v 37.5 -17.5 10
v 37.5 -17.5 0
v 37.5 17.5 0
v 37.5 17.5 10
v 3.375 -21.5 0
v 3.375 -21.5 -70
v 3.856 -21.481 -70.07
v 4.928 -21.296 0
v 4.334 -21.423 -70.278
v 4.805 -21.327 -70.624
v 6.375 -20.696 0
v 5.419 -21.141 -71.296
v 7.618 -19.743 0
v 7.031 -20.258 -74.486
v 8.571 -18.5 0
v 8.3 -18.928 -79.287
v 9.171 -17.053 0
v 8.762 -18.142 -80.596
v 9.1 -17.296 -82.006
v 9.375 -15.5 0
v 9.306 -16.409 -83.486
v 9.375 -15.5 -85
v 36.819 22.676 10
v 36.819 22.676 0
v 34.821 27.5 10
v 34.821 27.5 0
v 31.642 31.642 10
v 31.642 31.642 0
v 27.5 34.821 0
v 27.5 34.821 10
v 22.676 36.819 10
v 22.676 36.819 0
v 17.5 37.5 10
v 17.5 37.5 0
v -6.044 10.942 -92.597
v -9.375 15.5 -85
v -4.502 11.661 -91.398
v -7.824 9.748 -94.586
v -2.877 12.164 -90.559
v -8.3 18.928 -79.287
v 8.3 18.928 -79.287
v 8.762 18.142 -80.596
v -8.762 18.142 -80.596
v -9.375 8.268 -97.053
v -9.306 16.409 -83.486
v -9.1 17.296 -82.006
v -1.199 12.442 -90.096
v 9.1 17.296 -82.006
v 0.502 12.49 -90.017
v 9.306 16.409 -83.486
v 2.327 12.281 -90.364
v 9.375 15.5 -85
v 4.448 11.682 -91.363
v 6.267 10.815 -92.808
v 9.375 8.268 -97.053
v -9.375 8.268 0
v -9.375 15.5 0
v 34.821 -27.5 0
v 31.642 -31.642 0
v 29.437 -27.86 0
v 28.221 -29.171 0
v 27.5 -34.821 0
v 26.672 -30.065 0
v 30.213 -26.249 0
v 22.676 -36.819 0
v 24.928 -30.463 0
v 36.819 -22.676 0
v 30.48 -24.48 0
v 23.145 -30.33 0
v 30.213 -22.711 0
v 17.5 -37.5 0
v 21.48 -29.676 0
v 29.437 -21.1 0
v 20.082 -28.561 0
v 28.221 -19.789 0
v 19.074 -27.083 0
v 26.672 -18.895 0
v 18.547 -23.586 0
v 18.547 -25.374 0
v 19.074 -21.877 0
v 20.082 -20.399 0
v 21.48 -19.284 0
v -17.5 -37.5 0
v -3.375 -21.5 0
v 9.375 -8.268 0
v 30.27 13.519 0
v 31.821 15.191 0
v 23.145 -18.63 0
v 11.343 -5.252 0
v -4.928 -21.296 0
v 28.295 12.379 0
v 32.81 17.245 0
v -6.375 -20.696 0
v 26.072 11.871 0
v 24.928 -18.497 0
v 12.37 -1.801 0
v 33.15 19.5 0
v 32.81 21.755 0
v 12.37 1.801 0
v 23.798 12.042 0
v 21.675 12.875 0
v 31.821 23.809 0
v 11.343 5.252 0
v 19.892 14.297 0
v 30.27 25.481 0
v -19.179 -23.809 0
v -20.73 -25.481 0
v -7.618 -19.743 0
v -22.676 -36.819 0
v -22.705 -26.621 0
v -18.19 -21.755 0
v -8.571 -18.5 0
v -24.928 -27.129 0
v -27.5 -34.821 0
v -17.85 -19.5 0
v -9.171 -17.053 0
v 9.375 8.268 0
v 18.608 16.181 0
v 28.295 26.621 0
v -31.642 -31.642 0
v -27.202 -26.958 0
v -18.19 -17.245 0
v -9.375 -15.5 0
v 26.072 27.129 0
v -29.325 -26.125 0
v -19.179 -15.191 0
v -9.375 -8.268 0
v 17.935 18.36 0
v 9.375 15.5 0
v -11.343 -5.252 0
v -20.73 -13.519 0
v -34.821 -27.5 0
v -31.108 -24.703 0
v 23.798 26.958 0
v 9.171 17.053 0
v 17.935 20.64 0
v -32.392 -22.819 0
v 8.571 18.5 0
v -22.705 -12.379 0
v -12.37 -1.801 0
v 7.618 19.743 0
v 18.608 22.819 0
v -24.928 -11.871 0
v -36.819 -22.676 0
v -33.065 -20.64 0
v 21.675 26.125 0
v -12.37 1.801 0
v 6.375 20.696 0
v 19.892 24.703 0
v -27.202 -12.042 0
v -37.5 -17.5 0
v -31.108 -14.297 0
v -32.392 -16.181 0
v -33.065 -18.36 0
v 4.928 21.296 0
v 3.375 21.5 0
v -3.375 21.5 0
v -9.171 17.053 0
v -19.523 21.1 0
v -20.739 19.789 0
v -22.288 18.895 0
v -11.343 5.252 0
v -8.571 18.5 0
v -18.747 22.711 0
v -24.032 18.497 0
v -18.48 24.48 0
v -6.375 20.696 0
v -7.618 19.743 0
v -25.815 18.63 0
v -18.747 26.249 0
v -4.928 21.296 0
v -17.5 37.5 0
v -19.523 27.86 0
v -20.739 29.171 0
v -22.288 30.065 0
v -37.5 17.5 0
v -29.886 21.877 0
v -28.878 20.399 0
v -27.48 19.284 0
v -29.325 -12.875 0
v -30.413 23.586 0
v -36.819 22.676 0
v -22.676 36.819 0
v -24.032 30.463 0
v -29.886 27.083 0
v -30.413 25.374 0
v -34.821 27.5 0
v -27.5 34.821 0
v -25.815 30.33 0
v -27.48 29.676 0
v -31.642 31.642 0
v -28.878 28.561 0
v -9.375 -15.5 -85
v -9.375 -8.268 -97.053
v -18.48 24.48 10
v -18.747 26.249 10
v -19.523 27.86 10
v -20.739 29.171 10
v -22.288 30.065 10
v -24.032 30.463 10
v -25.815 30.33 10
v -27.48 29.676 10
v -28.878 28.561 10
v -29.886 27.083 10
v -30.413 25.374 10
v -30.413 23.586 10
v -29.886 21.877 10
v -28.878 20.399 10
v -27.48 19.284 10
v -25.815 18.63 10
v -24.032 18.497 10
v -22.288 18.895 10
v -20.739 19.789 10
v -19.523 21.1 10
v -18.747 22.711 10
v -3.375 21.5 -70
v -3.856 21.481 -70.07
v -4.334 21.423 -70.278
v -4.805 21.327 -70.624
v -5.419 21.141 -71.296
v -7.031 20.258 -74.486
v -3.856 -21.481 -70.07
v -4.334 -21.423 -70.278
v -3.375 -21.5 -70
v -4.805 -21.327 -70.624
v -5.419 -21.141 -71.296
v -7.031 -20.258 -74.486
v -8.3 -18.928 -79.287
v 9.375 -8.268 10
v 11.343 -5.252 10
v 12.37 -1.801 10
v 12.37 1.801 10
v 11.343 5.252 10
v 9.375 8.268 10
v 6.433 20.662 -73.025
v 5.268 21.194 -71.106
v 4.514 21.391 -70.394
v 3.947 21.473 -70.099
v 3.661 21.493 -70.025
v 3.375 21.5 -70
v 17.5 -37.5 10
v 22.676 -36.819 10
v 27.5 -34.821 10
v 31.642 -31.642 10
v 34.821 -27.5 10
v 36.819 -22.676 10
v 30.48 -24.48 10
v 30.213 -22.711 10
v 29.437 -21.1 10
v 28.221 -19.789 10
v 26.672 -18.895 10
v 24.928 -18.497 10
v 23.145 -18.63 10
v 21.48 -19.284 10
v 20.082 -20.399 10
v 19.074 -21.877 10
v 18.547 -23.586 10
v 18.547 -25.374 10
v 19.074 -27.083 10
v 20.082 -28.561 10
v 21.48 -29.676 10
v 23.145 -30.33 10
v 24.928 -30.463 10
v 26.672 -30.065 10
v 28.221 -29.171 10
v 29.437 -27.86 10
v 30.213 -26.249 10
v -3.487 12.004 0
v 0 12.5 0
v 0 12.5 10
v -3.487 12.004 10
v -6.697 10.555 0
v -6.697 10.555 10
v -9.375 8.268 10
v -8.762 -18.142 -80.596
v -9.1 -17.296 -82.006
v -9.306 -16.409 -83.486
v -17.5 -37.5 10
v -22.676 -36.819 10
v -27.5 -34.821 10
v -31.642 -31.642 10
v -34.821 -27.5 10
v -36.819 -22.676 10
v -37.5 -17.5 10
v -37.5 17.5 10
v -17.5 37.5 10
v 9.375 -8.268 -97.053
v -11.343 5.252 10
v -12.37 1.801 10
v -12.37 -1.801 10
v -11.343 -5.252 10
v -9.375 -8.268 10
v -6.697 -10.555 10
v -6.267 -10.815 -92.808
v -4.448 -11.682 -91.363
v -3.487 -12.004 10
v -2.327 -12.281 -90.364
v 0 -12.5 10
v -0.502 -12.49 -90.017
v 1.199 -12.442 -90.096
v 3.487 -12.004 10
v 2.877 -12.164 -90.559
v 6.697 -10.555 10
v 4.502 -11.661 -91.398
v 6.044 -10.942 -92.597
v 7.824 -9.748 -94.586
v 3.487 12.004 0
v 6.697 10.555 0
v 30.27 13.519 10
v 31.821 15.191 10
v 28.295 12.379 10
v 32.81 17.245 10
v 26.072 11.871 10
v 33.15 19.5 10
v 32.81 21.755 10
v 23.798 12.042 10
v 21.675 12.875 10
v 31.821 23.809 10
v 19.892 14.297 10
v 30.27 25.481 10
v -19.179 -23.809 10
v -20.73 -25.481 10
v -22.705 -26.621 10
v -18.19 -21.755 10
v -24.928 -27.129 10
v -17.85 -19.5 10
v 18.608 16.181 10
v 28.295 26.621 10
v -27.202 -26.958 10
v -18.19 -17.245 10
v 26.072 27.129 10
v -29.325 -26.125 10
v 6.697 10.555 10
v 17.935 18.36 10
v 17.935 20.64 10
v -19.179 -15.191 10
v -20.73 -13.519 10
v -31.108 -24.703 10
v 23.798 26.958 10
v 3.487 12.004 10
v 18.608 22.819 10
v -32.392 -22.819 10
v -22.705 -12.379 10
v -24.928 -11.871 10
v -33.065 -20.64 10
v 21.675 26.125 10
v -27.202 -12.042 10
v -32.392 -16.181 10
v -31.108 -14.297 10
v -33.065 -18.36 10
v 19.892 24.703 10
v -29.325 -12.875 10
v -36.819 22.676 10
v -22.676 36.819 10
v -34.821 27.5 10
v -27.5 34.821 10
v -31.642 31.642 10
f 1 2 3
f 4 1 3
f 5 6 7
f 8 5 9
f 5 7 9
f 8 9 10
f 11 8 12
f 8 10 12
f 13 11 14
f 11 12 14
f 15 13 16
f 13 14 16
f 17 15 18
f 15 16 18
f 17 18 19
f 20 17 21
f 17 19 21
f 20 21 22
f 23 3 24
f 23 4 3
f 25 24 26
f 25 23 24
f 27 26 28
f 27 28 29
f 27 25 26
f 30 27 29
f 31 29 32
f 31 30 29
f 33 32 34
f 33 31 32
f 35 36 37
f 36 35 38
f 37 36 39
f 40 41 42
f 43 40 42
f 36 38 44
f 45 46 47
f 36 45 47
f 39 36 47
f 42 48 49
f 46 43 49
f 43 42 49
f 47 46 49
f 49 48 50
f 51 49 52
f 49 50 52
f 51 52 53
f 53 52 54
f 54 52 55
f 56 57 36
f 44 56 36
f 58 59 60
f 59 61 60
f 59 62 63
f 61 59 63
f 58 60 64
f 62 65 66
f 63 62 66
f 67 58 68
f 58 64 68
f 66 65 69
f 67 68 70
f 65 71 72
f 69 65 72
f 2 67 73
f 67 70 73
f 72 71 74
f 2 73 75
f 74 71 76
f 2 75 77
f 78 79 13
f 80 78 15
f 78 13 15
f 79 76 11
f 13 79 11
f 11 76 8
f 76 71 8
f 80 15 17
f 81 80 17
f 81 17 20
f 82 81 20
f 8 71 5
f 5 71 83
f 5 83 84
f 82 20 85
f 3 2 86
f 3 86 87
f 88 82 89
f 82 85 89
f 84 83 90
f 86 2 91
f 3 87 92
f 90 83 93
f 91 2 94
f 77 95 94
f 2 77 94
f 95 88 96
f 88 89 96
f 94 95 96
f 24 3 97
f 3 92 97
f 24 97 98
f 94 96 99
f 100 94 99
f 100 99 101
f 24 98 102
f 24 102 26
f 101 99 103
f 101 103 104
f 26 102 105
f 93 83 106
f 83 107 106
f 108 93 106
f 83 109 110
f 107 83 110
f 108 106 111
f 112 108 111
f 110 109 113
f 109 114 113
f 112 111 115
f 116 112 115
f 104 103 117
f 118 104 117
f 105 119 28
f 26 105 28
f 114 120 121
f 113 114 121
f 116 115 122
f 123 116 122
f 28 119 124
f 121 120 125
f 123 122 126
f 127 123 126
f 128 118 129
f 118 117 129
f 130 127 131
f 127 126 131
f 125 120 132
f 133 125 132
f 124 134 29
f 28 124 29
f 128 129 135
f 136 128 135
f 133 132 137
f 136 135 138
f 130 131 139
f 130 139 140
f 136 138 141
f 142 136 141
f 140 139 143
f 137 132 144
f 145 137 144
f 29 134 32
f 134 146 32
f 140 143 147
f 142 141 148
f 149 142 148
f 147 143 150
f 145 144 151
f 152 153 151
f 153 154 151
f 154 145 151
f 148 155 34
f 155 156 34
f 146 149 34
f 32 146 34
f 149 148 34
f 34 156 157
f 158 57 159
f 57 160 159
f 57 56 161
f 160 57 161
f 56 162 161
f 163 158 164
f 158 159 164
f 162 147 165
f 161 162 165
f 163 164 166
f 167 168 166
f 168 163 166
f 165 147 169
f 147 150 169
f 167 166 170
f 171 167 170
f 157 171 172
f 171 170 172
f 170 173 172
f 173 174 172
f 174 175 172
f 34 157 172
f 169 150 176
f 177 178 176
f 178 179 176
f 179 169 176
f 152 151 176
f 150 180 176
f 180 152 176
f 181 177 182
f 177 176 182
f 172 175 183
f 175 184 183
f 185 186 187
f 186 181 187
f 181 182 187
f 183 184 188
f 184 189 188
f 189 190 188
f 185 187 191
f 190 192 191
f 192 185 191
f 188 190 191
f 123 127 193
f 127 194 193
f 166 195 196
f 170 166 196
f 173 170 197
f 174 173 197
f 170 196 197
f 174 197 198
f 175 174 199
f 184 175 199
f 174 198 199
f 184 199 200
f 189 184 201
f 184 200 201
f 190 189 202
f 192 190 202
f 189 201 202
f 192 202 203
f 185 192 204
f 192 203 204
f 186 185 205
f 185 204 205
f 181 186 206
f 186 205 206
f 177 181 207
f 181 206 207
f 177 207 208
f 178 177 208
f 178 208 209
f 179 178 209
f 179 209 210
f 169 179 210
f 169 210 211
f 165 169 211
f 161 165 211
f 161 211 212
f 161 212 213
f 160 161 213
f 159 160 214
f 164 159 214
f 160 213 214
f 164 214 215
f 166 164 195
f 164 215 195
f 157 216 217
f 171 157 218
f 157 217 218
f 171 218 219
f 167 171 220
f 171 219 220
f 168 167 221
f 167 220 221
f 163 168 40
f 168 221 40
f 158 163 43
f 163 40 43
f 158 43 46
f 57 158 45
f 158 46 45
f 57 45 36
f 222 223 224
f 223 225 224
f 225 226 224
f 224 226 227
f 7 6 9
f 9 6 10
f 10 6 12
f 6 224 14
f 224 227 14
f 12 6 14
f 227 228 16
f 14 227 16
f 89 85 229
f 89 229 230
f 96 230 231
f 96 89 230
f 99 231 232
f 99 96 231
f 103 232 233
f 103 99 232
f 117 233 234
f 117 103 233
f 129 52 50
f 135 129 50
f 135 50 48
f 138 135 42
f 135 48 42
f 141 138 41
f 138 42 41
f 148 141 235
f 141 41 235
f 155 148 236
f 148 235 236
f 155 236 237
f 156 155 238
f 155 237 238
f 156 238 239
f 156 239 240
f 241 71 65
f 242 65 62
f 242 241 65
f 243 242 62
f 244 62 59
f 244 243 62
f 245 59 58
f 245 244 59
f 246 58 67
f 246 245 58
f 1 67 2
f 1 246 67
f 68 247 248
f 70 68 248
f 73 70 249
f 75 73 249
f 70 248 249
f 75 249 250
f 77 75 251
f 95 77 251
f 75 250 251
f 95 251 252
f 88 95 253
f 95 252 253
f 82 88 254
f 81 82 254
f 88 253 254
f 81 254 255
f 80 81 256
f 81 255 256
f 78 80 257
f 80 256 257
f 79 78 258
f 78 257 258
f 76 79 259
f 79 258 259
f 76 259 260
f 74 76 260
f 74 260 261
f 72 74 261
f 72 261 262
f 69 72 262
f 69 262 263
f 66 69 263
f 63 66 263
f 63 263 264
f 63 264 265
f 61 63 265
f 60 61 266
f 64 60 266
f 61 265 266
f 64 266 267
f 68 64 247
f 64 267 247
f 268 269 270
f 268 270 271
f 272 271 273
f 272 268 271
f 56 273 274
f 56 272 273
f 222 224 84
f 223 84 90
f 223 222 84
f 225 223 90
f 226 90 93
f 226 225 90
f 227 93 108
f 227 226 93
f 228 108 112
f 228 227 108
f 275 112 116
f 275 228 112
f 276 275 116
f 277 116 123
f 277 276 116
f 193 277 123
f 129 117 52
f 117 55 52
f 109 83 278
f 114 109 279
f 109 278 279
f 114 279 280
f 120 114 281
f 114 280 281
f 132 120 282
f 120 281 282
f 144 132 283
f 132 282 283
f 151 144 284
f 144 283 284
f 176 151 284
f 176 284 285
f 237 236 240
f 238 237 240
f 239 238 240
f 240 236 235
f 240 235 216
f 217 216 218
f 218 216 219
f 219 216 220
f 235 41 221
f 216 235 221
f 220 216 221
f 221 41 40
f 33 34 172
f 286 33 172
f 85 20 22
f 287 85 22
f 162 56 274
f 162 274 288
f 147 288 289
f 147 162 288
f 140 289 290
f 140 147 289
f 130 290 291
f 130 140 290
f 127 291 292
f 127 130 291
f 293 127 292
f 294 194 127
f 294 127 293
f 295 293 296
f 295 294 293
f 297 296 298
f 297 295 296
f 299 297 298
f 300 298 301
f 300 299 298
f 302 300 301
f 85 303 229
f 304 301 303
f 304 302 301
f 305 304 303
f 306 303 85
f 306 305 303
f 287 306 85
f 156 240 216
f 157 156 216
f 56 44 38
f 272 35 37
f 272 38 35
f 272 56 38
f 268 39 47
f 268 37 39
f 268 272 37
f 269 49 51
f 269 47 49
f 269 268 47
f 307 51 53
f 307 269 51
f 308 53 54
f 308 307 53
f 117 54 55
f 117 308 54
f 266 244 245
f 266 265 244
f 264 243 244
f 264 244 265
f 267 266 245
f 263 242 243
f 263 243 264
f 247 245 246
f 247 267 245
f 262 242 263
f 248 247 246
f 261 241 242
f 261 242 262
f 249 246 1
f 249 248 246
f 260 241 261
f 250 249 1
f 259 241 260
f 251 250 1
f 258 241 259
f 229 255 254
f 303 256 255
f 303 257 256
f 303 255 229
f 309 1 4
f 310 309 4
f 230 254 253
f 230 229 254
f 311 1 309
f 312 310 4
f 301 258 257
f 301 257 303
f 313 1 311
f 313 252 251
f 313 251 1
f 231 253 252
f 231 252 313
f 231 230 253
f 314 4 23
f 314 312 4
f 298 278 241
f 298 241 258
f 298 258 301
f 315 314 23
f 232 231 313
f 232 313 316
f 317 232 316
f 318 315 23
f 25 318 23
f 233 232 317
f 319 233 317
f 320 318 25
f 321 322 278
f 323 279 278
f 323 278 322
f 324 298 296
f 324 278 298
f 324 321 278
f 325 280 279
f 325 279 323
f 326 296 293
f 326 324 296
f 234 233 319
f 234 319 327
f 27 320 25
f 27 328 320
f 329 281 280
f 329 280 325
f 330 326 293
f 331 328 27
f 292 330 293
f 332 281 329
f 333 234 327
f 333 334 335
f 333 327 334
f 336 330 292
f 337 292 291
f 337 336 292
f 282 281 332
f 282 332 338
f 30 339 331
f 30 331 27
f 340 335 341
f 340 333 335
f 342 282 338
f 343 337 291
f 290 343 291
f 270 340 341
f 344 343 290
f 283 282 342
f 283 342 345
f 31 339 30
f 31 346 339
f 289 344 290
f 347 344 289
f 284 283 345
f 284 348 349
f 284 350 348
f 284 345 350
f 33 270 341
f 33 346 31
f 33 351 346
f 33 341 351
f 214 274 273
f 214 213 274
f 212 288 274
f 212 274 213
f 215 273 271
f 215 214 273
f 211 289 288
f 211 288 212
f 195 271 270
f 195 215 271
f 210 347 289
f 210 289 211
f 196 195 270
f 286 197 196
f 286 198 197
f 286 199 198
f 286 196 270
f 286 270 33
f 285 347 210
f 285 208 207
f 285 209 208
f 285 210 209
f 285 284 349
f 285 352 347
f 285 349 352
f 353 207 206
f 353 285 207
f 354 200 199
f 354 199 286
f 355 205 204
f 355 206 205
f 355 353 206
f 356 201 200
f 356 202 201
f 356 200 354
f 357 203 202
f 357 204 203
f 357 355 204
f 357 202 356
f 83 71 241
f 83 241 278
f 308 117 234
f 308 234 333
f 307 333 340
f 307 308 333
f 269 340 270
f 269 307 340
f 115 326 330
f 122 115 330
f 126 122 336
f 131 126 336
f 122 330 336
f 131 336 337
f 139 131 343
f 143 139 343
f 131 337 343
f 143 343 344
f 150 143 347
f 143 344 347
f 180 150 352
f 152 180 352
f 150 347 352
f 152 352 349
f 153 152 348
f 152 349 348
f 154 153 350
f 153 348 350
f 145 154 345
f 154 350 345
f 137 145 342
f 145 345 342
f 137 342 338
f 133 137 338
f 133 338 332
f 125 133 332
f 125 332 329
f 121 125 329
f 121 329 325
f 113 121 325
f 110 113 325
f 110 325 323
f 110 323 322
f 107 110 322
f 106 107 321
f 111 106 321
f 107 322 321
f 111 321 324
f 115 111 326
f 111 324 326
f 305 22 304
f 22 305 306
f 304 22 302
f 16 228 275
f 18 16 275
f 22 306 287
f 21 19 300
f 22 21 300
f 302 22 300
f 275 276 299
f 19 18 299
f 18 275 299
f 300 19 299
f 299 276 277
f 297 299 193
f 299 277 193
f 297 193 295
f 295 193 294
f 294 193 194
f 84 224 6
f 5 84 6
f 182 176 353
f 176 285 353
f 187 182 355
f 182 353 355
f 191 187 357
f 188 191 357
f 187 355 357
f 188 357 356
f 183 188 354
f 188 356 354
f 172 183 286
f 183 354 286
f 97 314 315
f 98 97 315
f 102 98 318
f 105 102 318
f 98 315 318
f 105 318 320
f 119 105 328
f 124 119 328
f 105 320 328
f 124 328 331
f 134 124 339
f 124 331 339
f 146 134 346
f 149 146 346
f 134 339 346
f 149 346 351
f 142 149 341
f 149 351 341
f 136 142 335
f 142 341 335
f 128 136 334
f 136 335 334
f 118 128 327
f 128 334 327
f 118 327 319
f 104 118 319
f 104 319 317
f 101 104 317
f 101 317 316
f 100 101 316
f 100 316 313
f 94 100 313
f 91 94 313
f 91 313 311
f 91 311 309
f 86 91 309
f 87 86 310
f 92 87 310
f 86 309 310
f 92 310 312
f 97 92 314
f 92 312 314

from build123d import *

# Parameters (mm, degrees)
CROQUIS2_W              = 75
CROQUIS2_H              = 75
SALIENTE_EXTRUIR1_DEPTH = 10
SALIENTE_EXTRUIR2_DEPTH = 100
CHAFL_N1_SIZE           = 25
CHAFL_N1_SIZE_2         = 15
CHAFL_N2_SIZE           = 25
CHAFL_N2_SIZE_2         = 15
CORTAR_EXTRUIR1_REACH   = 112.598
CHAFL_N3_SIZE           = 5
REDONDEO1_R             = 6
REDONDEO2_R             = 20
SKETCH1_R               = 7.65
SKETCH1_R_2             = 6
CUT_EXTRUDE2_DEPTH      = 10


with BuildPart() as part:
    # Croquis2 → Saliente-Extruir1 (new body)
    with BuildSketch(Plane(origin=(0, 0, 0), x_dir=(0, 1, 0), z_dir=(0, 0, 1))):
        Rectangle(CROQUIS2_W, CROQUIS2_H)
    extrude(amount=SALIENTE_EXTRUIR1_DEPTH)

    # Croquis2<3> → Saliente-Extruir2 (add)
    with BuildSketch(Plane(origin=(0, 0, 0), x_dir=(0, 1, 0), z_dir=(0, 0, 1))):
        with BuildLine():
            Line((-21.5, 9.375), (-21.5, -9.375))
            Line((-21.5, -9.375), (-8.267972847, -9.375))
            ThreePointArc((-8.267972847, -9.375), (-12.5, 0), (-8.267972847, 9.375))
            Line((-8.267972847, 9.375), (-21.5, 9.375))
        make_face()
        with BuildLine():
            ThreePointArc((8.267972847, 9.375), (12.5, 0), (8.267972847, -9.375))
            Line((8.267972847, -9.375), (21.5, -9.375))
            Line((21.5, -9.375), (21.5, 9.375))
            Line((21.5, 9.375), (8.267972847, 9.375))
        make_face()
    extrude(amount=-SALIENTE_EXTRUIR2_DEPTH)

    # Chaflán1
    # the kernel refuses this chamfer: 25, 15 mm, written as the material it takes off along each edge
    with BuildSketch(Plane(origin=(74.03152743, 21.5, -100), x_dir=(0, 0.01989341895858247, 0.9998021063601227), z_dir=(-1, 0, 0))) as chafl_n1_piece_1:
        Polygon((CHAFL_N1_SIZE * 0.99980210636, -CHAFL_N1_SIZE * 0.0198934189586), (-CHAFL_N1_SIZE_2 * 0.0198934189586, -CHAFL_N1_SIZE_2 * 0.99980210636), (0, 0), align=None)
    extrude(amount=148.06305486, mode=Mode.SUBTRACT)

    # Chaflán2
    # the kernel refuses this chamfer: 25, 15 mm, written as the material it takes off along each edge
    with BuildSketch(Plane(origin=(-74.03152743, -21.5, -100), x_dir=(0, -0.01989341895858247, 0.9998021063601227), z_dir=(1, 0, 0))) as chafl_n2_piece_1:
        Polygon((CHAFL_N2_SIZE * 0.99980210636, -CHAFL_N2_SIZE * 0.0198934189586), (-CHAFL_N2_SIZE_2 * 0.0198934189586, -CHAFL_N2_SIZE_2 * 0.99980210636), (0, 0), align=None)
    extrude(amount=148.06305486, mode=Mode.SUBTRACT)

    # Croquis2<4> → Cortar-Extruir1 (cut, up to next)
    with BuildSketch(Plane(origin=(0, 0, 0), x_dir=(0, 1, 0), z_dir=(0, 0, 1)), mode=Mode.PRIVATE) as cortar_extruir1_sk1:
        with BuildLine():
            ThreePointArc((-8.267972847, 9.375), (-12.5, 0), (-8.267972847, -9.375))
            Line((-8.267972847, -9.375), (8.267972847, -9.375))
            ThreePointArc((8.267972847, -9.375), (11.392972847, -5.142972847), (12.5, 0))
            ThreePointArc((12.5, 0), (11.392972847, 5.142972847), (8.267972847, 9.375))
            Line((8.267972847, 9.375), (-8.267972847, 9.375))
        make_face()
    cortar_extruir1_tool1 = extrude(cortar_extruir1_sk1.sketch, amount=CORTAR_EXTRUIR1_REACH, mode=Mode.PRIVATE) & part.part
    # Croquis2<4> → Cortar-Extruir1 (cut, up to next)
    with BuildSketch(Plane(origin=(0, 0, 0), x_dir=(0, 1, 0), z_dir=(0, 0, 1)), mode=Mode.PRIVATE) as cortar_extruir1_sk2:
        with BuildLine():
            Line((8.267972847, -9.375), (-8.267972847, -9.375))
            ThreePointArc((-8.267972847, -9.375), (0, -12.5), (8.267972847, -9.375))
        make_face()
    cortar_extruir1_tool2 = extrude(cortar_extruir1_sk2.sketch, amount=CORTAR_EXTRUIR1_REACH, mode=Mode.PRIVATE) & part.part
    # Croquis2<4> → Cortar-Extruir1 (cut, up to next)
    with BuildSketch(Plane(origin=(0, 0, 0), x_dir=(0, 1, 0), z_dir=(0, 0, 1)), mode=Mode.PRIVATE) as cortar_extruir1_sk3:
        with BuildLine():
            ThreePointArc((8.267972847, 9.375), (0, 12.5), (-8.267972847, 9.375))
            Line((-8.267972847, 9.375), (8.267972847, 9.375))
        make_face()
    cortar_extruir1_tool3 = extrude(cortar_extruir1_sk3.sketch, amount=CORTAR_EXTRUIR1_REACH, mode=Mode.PRIVATE) & part.part
    add(cortar_extruir1_tool1.solids().sort_by_distance((0, 0, 0))[0], mode=Mode.SUBTRACT)
    add(cortar_extruir1_tool2.solids().sort_by_distance((10.639442, 0, 0))[0], mode=Mode.SUBTRACT)
    add(cortar_extruir1_tool3.solids().sort_by_distance((-10.639442, 0, 0))[0], mode=Mode.SUBTRACT)

    # Chaflán3
    chafl_n3_edges = [part.edges().sort_by_distance(p)[0] for p in [
        (0, 21.5, -75),
        (0, -21.5, -75),
    ]]
    chamfer(chafl_n3_edges, length=CHAFL_N3_SIZE)

    # Redondeo1
    redondeo1_edges = [part.edges().sort_by_distance(p)[0] for p in [
        (-9.375, -21.5, -35),
        (9.375, -21.5, -35),
        (9.375, 21.5, -35),
        (-9.375, 21.5, -35),
    ]]
    fillet(redondeo1_edges, radius=REDONDEO1_R)

    # Redondeo2
    redondeo2_edges = [part.edges().sort_by_distance(p)[0] for p in [
        (37.5, -37.5, 5),
        (-37.5, -37.5, 5),
        (-37.5, 37.5, 5),
        (37.5, 37.5, 5),
    ]]
    fillet(redondeo2_edges, radius=REDONDEO2_R)

    # Sketch1 → Cut-Extrude2 (cut)
    with BuildSketch(Plane.XY.offset(10)):
        with Locations((25.5, 19.5)):
            Circle(SKETCH1_R)
        with Locations((-24.48, 24.48)):
            Circle(SKETCH1_R_2)
        with Locations((-25.5, -19.5)):
            Circle(SKETCH1_R)
        with Locations((24.48, -24.48)):
            Circle(SKETCH1_R_2)
    extrude(amount=-CUT_EXTRUDE2_DEPTH, mode=Mode.SUBTRACT)


solid = part.part
